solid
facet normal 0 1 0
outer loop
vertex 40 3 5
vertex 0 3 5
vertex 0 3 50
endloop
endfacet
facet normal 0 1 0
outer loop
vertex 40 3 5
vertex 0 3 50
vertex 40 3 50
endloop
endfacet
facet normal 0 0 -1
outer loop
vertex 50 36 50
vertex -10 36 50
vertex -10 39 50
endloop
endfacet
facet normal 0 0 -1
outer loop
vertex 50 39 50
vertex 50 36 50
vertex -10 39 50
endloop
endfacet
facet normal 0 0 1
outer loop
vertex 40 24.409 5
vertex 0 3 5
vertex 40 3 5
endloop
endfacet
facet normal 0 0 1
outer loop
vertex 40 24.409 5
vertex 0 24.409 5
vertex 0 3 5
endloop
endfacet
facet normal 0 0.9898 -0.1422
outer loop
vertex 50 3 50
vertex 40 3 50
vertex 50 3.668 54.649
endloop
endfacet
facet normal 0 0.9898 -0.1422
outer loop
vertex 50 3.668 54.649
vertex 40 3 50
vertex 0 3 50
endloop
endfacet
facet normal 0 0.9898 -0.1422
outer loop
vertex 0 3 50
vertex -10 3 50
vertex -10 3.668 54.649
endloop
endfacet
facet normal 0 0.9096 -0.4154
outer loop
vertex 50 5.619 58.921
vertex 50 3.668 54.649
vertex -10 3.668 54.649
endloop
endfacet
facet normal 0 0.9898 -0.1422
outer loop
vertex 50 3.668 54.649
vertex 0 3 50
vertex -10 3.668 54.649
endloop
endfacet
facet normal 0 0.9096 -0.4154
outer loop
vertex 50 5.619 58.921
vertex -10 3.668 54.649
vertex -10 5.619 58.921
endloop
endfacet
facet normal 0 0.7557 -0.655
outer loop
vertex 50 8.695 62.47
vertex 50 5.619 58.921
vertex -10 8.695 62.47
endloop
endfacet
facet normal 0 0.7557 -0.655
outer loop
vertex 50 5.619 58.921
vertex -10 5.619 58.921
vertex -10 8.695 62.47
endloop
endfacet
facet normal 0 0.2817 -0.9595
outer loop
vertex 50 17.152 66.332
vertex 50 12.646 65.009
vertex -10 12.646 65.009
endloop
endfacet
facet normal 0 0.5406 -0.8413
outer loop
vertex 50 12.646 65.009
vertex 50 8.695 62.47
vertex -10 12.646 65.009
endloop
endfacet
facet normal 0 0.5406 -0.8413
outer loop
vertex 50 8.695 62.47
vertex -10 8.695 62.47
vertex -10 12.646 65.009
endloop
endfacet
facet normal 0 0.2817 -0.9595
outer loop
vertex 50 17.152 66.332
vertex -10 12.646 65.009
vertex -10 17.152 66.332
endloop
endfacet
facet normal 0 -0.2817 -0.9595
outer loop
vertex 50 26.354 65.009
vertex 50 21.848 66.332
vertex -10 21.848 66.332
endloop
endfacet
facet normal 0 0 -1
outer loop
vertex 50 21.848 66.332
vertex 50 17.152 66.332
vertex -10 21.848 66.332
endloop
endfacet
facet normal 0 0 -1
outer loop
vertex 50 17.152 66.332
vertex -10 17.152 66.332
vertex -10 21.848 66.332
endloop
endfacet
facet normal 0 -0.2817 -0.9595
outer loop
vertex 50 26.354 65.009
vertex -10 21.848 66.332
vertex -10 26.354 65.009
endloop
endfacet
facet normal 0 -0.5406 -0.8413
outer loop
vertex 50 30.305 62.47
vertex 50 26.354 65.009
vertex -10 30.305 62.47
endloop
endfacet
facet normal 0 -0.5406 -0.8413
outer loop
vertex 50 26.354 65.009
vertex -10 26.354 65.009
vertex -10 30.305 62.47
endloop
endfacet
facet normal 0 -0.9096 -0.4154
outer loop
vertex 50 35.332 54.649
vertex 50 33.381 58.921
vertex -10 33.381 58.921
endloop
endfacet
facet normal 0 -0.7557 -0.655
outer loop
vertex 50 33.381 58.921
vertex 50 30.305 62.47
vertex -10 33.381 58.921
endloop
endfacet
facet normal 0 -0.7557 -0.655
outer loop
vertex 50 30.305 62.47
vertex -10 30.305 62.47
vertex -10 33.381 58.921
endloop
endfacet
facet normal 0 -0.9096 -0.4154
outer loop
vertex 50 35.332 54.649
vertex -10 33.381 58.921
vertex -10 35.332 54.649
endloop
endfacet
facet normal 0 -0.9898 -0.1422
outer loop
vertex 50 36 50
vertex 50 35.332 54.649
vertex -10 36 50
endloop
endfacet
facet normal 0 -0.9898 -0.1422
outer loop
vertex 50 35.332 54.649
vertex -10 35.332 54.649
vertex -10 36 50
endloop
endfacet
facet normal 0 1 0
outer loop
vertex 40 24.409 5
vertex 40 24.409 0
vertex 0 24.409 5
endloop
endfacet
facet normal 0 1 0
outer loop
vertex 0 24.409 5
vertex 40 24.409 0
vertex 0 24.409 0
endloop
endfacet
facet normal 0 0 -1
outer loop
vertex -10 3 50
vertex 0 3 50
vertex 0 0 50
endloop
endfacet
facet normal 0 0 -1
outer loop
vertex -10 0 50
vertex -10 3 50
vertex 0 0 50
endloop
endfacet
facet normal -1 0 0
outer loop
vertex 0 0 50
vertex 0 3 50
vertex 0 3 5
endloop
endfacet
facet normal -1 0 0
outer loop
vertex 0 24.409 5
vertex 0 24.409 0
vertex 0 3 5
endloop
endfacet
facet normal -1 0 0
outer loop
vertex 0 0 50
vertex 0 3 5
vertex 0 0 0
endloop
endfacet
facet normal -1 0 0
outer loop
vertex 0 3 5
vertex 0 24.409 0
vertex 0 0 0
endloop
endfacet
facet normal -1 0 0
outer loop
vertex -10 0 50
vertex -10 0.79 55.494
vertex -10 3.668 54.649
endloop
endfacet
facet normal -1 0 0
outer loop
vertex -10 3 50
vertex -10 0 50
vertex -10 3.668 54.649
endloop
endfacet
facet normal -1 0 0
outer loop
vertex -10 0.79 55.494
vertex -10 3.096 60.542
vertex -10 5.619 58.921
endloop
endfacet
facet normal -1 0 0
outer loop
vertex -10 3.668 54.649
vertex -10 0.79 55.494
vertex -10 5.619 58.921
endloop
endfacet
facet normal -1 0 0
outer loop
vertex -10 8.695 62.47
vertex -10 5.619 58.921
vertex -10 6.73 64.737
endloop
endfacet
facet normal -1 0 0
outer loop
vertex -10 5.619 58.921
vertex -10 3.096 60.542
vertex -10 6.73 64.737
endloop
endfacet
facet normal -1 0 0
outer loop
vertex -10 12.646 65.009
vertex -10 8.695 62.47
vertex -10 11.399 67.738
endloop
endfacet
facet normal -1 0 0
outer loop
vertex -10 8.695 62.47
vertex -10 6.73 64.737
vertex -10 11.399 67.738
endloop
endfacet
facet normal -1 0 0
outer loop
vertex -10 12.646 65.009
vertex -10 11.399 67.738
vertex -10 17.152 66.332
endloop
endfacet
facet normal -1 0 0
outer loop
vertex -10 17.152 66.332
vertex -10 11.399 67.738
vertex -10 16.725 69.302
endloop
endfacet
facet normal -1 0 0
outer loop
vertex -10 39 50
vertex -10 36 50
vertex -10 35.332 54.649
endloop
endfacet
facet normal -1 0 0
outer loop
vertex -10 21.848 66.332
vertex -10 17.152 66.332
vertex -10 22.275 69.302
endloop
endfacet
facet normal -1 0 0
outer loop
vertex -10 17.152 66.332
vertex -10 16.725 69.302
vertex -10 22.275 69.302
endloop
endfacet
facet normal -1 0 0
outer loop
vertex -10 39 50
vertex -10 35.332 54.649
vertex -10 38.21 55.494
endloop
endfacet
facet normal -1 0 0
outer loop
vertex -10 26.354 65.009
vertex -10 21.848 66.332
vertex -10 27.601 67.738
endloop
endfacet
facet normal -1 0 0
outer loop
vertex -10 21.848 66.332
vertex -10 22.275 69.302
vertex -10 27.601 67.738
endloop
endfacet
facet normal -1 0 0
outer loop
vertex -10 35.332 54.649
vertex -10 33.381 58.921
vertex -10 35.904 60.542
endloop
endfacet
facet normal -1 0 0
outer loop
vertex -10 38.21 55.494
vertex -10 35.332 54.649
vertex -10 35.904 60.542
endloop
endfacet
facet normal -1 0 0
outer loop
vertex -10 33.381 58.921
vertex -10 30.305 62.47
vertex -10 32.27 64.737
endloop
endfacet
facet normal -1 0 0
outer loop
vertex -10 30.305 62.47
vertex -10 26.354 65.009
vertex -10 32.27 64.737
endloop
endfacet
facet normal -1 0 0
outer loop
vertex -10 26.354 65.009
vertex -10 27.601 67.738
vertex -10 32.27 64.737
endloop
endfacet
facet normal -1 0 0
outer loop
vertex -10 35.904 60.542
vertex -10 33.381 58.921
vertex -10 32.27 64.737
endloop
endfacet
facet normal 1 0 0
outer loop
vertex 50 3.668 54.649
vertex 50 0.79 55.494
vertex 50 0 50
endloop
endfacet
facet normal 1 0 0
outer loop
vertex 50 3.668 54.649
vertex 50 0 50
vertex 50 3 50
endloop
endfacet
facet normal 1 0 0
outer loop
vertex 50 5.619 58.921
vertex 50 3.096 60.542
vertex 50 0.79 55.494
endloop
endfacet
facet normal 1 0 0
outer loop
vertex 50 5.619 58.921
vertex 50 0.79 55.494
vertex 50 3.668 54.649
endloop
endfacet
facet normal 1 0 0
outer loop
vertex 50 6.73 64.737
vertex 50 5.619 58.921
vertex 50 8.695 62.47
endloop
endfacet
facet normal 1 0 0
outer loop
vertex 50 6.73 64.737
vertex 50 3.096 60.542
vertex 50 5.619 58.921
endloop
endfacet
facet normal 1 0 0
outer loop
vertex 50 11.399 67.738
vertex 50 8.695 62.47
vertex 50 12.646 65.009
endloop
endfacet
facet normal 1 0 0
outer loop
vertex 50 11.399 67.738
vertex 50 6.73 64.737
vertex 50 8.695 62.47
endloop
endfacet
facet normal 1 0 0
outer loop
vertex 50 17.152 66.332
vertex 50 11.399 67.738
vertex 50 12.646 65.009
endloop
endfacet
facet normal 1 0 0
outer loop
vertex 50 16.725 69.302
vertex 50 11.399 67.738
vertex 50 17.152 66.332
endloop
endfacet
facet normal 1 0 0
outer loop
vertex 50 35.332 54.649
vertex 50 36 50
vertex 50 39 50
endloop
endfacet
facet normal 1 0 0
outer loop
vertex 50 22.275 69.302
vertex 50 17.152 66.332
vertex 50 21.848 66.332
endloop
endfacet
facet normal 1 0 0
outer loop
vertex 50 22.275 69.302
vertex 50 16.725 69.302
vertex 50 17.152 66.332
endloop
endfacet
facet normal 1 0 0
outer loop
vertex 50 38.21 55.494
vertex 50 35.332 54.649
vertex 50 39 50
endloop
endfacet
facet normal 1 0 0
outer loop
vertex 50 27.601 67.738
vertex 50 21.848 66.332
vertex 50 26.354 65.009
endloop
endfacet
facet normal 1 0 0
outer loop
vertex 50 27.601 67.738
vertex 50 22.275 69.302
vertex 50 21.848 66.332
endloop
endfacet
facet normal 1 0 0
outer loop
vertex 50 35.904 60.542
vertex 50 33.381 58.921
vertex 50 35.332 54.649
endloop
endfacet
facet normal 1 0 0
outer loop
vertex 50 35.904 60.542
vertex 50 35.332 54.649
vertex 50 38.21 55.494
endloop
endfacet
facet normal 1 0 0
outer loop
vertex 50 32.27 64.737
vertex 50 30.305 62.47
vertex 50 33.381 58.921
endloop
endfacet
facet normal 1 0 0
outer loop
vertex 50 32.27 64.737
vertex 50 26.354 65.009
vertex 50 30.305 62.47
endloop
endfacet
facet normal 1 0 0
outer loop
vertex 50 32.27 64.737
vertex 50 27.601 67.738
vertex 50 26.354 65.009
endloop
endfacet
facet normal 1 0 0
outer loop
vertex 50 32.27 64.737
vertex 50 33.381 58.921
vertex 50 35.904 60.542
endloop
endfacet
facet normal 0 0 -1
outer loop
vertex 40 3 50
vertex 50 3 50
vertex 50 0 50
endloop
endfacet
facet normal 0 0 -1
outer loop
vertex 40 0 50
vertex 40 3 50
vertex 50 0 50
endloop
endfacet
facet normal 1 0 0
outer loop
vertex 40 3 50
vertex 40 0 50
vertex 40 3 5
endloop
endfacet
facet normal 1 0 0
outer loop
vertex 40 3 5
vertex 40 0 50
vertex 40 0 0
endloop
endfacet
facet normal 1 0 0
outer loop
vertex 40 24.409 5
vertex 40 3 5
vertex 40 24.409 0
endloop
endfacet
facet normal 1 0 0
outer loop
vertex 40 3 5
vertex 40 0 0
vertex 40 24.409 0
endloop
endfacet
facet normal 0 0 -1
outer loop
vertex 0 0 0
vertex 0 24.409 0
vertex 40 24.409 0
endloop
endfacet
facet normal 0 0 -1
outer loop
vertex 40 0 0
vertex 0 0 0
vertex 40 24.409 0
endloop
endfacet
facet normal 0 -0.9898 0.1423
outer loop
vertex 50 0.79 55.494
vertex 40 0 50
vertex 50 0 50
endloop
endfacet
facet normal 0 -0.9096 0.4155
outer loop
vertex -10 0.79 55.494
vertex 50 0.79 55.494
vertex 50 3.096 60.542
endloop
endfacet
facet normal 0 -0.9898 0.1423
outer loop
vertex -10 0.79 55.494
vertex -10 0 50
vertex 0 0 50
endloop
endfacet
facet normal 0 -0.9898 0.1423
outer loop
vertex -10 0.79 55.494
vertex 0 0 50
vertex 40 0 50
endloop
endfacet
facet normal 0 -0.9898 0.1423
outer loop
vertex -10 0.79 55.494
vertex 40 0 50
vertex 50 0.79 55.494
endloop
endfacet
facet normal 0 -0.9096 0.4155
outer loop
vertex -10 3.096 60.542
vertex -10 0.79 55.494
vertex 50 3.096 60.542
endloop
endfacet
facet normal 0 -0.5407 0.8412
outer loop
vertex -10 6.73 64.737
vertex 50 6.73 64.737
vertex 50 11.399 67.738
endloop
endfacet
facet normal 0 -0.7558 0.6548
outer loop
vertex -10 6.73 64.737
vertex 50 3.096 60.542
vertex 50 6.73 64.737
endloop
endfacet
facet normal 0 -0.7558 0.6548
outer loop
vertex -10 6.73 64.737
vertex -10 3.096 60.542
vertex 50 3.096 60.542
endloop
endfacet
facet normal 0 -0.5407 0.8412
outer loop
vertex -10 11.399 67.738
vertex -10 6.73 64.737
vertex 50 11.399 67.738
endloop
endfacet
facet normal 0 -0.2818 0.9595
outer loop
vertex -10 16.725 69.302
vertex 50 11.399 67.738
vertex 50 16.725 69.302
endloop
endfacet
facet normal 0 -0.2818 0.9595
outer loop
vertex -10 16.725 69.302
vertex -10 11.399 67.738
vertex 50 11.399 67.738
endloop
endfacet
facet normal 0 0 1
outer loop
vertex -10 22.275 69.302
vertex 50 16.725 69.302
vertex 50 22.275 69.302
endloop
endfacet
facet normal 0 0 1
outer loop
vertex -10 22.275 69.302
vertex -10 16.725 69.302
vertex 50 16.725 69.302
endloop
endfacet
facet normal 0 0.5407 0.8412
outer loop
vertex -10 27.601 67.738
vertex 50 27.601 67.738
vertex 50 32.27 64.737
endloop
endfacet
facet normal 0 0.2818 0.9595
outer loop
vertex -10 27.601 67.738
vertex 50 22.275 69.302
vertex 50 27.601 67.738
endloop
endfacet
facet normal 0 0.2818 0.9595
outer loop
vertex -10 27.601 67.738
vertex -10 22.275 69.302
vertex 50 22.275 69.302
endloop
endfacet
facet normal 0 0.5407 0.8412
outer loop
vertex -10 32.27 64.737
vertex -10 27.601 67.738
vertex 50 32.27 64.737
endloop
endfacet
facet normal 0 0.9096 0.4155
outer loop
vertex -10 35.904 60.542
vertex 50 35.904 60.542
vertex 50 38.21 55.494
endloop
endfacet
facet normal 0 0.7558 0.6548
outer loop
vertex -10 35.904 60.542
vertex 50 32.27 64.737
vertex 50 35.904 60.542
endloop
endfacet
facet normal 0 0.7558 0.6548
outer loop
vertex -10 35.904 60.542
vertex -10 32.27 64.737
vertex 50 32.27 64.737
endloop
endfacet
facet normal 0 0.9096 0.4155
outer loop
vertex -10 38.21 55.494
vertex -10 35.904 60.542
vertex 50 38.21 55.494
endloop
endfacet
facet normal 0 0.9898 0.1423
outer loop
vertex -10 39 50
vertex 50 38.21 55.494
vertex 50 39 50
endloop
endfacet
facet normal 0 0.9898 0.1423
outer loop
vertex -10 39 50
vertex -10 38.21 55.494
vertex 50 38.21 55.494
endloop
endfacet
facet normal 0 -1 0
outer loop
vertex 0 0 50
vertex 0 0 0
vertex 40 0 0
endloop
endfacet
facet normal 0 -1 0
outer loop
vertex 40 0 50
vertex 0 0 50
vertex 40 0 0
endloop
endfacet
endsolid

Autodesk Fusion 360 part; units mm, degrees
sketch "Sketch2" plane through (0, 0, 0) normal (0, 0, 1) x (1, 0, 0)
  line L0 (0, 0) -> (40, 0)
  line L1 (40, 0) -> (40, 24.4086)
  line L2 (40, 24.4086) -> (0, 24.4086)
  line L3 (0, 24.4086) -> (0, 0)
extrude "Extrude1" add sketch "Sketch2" along normal blind 5
sketch "Sketch3" plane through (0, 0, 0) normal (0, -1, 0) x (1, 0, 0)
  line L0 (0, 0) -> (40, 0)
  line L1 (40, 0) -> (40, 5)
  line L2 (40, 5) -> (0, 5)
  line L3 (0, 5) -> (0, 0)
  line L4 (0, 0) -> (40, 0)
  line L5 (40, 0) -> (40, 50)
  line L6 (40, 50) -> (0, 50)
  line L7 (0, 50) -> (0, 0)
extrude "Extrude2" add sketch "Sketch3" against normal blind 3 contours L2 L5 L6 L7
sketch "Sketch4" plane through (40, 0, 0) normal (1, 0, 0) x (0, 1, 0)
  line L0 (0, 0) -> (24.4086, 0)
  line L1 (24.4086, 0) -> (24.4086, 5)
  line L2 (24.4086, 5) -> (3, 5)
  line L3 (3, 5) -> (3, 50)
  line L4 (3, 50) -> (0, 50)
  line L5 (0, 50) -> (0, 0)
  line L6 (19.5, 40) -> (19.5, 70) construction
  arc A0 (36, 50) -> (3, 50) centre (19.5, 50) ccw
  arc A1 (39, 50) -> (0, 50) centre (19.5, 50) ccw
  line L7 (36, 50) -> (39, 50)
  line L8 (36, 50) -> (39, 50)
  line L9 (0, 50) -> (3, 50)
  dimension "d7" = 16.5
  dimension "d8" = 3
extrude "Extrude3" add sketch "Sketch4" along normal blind 10 and the other way blind 50 contours L4 A0 A1 L7 L8 L9
equation "d7 = ( 33 / 2 ) * 1 mm"
